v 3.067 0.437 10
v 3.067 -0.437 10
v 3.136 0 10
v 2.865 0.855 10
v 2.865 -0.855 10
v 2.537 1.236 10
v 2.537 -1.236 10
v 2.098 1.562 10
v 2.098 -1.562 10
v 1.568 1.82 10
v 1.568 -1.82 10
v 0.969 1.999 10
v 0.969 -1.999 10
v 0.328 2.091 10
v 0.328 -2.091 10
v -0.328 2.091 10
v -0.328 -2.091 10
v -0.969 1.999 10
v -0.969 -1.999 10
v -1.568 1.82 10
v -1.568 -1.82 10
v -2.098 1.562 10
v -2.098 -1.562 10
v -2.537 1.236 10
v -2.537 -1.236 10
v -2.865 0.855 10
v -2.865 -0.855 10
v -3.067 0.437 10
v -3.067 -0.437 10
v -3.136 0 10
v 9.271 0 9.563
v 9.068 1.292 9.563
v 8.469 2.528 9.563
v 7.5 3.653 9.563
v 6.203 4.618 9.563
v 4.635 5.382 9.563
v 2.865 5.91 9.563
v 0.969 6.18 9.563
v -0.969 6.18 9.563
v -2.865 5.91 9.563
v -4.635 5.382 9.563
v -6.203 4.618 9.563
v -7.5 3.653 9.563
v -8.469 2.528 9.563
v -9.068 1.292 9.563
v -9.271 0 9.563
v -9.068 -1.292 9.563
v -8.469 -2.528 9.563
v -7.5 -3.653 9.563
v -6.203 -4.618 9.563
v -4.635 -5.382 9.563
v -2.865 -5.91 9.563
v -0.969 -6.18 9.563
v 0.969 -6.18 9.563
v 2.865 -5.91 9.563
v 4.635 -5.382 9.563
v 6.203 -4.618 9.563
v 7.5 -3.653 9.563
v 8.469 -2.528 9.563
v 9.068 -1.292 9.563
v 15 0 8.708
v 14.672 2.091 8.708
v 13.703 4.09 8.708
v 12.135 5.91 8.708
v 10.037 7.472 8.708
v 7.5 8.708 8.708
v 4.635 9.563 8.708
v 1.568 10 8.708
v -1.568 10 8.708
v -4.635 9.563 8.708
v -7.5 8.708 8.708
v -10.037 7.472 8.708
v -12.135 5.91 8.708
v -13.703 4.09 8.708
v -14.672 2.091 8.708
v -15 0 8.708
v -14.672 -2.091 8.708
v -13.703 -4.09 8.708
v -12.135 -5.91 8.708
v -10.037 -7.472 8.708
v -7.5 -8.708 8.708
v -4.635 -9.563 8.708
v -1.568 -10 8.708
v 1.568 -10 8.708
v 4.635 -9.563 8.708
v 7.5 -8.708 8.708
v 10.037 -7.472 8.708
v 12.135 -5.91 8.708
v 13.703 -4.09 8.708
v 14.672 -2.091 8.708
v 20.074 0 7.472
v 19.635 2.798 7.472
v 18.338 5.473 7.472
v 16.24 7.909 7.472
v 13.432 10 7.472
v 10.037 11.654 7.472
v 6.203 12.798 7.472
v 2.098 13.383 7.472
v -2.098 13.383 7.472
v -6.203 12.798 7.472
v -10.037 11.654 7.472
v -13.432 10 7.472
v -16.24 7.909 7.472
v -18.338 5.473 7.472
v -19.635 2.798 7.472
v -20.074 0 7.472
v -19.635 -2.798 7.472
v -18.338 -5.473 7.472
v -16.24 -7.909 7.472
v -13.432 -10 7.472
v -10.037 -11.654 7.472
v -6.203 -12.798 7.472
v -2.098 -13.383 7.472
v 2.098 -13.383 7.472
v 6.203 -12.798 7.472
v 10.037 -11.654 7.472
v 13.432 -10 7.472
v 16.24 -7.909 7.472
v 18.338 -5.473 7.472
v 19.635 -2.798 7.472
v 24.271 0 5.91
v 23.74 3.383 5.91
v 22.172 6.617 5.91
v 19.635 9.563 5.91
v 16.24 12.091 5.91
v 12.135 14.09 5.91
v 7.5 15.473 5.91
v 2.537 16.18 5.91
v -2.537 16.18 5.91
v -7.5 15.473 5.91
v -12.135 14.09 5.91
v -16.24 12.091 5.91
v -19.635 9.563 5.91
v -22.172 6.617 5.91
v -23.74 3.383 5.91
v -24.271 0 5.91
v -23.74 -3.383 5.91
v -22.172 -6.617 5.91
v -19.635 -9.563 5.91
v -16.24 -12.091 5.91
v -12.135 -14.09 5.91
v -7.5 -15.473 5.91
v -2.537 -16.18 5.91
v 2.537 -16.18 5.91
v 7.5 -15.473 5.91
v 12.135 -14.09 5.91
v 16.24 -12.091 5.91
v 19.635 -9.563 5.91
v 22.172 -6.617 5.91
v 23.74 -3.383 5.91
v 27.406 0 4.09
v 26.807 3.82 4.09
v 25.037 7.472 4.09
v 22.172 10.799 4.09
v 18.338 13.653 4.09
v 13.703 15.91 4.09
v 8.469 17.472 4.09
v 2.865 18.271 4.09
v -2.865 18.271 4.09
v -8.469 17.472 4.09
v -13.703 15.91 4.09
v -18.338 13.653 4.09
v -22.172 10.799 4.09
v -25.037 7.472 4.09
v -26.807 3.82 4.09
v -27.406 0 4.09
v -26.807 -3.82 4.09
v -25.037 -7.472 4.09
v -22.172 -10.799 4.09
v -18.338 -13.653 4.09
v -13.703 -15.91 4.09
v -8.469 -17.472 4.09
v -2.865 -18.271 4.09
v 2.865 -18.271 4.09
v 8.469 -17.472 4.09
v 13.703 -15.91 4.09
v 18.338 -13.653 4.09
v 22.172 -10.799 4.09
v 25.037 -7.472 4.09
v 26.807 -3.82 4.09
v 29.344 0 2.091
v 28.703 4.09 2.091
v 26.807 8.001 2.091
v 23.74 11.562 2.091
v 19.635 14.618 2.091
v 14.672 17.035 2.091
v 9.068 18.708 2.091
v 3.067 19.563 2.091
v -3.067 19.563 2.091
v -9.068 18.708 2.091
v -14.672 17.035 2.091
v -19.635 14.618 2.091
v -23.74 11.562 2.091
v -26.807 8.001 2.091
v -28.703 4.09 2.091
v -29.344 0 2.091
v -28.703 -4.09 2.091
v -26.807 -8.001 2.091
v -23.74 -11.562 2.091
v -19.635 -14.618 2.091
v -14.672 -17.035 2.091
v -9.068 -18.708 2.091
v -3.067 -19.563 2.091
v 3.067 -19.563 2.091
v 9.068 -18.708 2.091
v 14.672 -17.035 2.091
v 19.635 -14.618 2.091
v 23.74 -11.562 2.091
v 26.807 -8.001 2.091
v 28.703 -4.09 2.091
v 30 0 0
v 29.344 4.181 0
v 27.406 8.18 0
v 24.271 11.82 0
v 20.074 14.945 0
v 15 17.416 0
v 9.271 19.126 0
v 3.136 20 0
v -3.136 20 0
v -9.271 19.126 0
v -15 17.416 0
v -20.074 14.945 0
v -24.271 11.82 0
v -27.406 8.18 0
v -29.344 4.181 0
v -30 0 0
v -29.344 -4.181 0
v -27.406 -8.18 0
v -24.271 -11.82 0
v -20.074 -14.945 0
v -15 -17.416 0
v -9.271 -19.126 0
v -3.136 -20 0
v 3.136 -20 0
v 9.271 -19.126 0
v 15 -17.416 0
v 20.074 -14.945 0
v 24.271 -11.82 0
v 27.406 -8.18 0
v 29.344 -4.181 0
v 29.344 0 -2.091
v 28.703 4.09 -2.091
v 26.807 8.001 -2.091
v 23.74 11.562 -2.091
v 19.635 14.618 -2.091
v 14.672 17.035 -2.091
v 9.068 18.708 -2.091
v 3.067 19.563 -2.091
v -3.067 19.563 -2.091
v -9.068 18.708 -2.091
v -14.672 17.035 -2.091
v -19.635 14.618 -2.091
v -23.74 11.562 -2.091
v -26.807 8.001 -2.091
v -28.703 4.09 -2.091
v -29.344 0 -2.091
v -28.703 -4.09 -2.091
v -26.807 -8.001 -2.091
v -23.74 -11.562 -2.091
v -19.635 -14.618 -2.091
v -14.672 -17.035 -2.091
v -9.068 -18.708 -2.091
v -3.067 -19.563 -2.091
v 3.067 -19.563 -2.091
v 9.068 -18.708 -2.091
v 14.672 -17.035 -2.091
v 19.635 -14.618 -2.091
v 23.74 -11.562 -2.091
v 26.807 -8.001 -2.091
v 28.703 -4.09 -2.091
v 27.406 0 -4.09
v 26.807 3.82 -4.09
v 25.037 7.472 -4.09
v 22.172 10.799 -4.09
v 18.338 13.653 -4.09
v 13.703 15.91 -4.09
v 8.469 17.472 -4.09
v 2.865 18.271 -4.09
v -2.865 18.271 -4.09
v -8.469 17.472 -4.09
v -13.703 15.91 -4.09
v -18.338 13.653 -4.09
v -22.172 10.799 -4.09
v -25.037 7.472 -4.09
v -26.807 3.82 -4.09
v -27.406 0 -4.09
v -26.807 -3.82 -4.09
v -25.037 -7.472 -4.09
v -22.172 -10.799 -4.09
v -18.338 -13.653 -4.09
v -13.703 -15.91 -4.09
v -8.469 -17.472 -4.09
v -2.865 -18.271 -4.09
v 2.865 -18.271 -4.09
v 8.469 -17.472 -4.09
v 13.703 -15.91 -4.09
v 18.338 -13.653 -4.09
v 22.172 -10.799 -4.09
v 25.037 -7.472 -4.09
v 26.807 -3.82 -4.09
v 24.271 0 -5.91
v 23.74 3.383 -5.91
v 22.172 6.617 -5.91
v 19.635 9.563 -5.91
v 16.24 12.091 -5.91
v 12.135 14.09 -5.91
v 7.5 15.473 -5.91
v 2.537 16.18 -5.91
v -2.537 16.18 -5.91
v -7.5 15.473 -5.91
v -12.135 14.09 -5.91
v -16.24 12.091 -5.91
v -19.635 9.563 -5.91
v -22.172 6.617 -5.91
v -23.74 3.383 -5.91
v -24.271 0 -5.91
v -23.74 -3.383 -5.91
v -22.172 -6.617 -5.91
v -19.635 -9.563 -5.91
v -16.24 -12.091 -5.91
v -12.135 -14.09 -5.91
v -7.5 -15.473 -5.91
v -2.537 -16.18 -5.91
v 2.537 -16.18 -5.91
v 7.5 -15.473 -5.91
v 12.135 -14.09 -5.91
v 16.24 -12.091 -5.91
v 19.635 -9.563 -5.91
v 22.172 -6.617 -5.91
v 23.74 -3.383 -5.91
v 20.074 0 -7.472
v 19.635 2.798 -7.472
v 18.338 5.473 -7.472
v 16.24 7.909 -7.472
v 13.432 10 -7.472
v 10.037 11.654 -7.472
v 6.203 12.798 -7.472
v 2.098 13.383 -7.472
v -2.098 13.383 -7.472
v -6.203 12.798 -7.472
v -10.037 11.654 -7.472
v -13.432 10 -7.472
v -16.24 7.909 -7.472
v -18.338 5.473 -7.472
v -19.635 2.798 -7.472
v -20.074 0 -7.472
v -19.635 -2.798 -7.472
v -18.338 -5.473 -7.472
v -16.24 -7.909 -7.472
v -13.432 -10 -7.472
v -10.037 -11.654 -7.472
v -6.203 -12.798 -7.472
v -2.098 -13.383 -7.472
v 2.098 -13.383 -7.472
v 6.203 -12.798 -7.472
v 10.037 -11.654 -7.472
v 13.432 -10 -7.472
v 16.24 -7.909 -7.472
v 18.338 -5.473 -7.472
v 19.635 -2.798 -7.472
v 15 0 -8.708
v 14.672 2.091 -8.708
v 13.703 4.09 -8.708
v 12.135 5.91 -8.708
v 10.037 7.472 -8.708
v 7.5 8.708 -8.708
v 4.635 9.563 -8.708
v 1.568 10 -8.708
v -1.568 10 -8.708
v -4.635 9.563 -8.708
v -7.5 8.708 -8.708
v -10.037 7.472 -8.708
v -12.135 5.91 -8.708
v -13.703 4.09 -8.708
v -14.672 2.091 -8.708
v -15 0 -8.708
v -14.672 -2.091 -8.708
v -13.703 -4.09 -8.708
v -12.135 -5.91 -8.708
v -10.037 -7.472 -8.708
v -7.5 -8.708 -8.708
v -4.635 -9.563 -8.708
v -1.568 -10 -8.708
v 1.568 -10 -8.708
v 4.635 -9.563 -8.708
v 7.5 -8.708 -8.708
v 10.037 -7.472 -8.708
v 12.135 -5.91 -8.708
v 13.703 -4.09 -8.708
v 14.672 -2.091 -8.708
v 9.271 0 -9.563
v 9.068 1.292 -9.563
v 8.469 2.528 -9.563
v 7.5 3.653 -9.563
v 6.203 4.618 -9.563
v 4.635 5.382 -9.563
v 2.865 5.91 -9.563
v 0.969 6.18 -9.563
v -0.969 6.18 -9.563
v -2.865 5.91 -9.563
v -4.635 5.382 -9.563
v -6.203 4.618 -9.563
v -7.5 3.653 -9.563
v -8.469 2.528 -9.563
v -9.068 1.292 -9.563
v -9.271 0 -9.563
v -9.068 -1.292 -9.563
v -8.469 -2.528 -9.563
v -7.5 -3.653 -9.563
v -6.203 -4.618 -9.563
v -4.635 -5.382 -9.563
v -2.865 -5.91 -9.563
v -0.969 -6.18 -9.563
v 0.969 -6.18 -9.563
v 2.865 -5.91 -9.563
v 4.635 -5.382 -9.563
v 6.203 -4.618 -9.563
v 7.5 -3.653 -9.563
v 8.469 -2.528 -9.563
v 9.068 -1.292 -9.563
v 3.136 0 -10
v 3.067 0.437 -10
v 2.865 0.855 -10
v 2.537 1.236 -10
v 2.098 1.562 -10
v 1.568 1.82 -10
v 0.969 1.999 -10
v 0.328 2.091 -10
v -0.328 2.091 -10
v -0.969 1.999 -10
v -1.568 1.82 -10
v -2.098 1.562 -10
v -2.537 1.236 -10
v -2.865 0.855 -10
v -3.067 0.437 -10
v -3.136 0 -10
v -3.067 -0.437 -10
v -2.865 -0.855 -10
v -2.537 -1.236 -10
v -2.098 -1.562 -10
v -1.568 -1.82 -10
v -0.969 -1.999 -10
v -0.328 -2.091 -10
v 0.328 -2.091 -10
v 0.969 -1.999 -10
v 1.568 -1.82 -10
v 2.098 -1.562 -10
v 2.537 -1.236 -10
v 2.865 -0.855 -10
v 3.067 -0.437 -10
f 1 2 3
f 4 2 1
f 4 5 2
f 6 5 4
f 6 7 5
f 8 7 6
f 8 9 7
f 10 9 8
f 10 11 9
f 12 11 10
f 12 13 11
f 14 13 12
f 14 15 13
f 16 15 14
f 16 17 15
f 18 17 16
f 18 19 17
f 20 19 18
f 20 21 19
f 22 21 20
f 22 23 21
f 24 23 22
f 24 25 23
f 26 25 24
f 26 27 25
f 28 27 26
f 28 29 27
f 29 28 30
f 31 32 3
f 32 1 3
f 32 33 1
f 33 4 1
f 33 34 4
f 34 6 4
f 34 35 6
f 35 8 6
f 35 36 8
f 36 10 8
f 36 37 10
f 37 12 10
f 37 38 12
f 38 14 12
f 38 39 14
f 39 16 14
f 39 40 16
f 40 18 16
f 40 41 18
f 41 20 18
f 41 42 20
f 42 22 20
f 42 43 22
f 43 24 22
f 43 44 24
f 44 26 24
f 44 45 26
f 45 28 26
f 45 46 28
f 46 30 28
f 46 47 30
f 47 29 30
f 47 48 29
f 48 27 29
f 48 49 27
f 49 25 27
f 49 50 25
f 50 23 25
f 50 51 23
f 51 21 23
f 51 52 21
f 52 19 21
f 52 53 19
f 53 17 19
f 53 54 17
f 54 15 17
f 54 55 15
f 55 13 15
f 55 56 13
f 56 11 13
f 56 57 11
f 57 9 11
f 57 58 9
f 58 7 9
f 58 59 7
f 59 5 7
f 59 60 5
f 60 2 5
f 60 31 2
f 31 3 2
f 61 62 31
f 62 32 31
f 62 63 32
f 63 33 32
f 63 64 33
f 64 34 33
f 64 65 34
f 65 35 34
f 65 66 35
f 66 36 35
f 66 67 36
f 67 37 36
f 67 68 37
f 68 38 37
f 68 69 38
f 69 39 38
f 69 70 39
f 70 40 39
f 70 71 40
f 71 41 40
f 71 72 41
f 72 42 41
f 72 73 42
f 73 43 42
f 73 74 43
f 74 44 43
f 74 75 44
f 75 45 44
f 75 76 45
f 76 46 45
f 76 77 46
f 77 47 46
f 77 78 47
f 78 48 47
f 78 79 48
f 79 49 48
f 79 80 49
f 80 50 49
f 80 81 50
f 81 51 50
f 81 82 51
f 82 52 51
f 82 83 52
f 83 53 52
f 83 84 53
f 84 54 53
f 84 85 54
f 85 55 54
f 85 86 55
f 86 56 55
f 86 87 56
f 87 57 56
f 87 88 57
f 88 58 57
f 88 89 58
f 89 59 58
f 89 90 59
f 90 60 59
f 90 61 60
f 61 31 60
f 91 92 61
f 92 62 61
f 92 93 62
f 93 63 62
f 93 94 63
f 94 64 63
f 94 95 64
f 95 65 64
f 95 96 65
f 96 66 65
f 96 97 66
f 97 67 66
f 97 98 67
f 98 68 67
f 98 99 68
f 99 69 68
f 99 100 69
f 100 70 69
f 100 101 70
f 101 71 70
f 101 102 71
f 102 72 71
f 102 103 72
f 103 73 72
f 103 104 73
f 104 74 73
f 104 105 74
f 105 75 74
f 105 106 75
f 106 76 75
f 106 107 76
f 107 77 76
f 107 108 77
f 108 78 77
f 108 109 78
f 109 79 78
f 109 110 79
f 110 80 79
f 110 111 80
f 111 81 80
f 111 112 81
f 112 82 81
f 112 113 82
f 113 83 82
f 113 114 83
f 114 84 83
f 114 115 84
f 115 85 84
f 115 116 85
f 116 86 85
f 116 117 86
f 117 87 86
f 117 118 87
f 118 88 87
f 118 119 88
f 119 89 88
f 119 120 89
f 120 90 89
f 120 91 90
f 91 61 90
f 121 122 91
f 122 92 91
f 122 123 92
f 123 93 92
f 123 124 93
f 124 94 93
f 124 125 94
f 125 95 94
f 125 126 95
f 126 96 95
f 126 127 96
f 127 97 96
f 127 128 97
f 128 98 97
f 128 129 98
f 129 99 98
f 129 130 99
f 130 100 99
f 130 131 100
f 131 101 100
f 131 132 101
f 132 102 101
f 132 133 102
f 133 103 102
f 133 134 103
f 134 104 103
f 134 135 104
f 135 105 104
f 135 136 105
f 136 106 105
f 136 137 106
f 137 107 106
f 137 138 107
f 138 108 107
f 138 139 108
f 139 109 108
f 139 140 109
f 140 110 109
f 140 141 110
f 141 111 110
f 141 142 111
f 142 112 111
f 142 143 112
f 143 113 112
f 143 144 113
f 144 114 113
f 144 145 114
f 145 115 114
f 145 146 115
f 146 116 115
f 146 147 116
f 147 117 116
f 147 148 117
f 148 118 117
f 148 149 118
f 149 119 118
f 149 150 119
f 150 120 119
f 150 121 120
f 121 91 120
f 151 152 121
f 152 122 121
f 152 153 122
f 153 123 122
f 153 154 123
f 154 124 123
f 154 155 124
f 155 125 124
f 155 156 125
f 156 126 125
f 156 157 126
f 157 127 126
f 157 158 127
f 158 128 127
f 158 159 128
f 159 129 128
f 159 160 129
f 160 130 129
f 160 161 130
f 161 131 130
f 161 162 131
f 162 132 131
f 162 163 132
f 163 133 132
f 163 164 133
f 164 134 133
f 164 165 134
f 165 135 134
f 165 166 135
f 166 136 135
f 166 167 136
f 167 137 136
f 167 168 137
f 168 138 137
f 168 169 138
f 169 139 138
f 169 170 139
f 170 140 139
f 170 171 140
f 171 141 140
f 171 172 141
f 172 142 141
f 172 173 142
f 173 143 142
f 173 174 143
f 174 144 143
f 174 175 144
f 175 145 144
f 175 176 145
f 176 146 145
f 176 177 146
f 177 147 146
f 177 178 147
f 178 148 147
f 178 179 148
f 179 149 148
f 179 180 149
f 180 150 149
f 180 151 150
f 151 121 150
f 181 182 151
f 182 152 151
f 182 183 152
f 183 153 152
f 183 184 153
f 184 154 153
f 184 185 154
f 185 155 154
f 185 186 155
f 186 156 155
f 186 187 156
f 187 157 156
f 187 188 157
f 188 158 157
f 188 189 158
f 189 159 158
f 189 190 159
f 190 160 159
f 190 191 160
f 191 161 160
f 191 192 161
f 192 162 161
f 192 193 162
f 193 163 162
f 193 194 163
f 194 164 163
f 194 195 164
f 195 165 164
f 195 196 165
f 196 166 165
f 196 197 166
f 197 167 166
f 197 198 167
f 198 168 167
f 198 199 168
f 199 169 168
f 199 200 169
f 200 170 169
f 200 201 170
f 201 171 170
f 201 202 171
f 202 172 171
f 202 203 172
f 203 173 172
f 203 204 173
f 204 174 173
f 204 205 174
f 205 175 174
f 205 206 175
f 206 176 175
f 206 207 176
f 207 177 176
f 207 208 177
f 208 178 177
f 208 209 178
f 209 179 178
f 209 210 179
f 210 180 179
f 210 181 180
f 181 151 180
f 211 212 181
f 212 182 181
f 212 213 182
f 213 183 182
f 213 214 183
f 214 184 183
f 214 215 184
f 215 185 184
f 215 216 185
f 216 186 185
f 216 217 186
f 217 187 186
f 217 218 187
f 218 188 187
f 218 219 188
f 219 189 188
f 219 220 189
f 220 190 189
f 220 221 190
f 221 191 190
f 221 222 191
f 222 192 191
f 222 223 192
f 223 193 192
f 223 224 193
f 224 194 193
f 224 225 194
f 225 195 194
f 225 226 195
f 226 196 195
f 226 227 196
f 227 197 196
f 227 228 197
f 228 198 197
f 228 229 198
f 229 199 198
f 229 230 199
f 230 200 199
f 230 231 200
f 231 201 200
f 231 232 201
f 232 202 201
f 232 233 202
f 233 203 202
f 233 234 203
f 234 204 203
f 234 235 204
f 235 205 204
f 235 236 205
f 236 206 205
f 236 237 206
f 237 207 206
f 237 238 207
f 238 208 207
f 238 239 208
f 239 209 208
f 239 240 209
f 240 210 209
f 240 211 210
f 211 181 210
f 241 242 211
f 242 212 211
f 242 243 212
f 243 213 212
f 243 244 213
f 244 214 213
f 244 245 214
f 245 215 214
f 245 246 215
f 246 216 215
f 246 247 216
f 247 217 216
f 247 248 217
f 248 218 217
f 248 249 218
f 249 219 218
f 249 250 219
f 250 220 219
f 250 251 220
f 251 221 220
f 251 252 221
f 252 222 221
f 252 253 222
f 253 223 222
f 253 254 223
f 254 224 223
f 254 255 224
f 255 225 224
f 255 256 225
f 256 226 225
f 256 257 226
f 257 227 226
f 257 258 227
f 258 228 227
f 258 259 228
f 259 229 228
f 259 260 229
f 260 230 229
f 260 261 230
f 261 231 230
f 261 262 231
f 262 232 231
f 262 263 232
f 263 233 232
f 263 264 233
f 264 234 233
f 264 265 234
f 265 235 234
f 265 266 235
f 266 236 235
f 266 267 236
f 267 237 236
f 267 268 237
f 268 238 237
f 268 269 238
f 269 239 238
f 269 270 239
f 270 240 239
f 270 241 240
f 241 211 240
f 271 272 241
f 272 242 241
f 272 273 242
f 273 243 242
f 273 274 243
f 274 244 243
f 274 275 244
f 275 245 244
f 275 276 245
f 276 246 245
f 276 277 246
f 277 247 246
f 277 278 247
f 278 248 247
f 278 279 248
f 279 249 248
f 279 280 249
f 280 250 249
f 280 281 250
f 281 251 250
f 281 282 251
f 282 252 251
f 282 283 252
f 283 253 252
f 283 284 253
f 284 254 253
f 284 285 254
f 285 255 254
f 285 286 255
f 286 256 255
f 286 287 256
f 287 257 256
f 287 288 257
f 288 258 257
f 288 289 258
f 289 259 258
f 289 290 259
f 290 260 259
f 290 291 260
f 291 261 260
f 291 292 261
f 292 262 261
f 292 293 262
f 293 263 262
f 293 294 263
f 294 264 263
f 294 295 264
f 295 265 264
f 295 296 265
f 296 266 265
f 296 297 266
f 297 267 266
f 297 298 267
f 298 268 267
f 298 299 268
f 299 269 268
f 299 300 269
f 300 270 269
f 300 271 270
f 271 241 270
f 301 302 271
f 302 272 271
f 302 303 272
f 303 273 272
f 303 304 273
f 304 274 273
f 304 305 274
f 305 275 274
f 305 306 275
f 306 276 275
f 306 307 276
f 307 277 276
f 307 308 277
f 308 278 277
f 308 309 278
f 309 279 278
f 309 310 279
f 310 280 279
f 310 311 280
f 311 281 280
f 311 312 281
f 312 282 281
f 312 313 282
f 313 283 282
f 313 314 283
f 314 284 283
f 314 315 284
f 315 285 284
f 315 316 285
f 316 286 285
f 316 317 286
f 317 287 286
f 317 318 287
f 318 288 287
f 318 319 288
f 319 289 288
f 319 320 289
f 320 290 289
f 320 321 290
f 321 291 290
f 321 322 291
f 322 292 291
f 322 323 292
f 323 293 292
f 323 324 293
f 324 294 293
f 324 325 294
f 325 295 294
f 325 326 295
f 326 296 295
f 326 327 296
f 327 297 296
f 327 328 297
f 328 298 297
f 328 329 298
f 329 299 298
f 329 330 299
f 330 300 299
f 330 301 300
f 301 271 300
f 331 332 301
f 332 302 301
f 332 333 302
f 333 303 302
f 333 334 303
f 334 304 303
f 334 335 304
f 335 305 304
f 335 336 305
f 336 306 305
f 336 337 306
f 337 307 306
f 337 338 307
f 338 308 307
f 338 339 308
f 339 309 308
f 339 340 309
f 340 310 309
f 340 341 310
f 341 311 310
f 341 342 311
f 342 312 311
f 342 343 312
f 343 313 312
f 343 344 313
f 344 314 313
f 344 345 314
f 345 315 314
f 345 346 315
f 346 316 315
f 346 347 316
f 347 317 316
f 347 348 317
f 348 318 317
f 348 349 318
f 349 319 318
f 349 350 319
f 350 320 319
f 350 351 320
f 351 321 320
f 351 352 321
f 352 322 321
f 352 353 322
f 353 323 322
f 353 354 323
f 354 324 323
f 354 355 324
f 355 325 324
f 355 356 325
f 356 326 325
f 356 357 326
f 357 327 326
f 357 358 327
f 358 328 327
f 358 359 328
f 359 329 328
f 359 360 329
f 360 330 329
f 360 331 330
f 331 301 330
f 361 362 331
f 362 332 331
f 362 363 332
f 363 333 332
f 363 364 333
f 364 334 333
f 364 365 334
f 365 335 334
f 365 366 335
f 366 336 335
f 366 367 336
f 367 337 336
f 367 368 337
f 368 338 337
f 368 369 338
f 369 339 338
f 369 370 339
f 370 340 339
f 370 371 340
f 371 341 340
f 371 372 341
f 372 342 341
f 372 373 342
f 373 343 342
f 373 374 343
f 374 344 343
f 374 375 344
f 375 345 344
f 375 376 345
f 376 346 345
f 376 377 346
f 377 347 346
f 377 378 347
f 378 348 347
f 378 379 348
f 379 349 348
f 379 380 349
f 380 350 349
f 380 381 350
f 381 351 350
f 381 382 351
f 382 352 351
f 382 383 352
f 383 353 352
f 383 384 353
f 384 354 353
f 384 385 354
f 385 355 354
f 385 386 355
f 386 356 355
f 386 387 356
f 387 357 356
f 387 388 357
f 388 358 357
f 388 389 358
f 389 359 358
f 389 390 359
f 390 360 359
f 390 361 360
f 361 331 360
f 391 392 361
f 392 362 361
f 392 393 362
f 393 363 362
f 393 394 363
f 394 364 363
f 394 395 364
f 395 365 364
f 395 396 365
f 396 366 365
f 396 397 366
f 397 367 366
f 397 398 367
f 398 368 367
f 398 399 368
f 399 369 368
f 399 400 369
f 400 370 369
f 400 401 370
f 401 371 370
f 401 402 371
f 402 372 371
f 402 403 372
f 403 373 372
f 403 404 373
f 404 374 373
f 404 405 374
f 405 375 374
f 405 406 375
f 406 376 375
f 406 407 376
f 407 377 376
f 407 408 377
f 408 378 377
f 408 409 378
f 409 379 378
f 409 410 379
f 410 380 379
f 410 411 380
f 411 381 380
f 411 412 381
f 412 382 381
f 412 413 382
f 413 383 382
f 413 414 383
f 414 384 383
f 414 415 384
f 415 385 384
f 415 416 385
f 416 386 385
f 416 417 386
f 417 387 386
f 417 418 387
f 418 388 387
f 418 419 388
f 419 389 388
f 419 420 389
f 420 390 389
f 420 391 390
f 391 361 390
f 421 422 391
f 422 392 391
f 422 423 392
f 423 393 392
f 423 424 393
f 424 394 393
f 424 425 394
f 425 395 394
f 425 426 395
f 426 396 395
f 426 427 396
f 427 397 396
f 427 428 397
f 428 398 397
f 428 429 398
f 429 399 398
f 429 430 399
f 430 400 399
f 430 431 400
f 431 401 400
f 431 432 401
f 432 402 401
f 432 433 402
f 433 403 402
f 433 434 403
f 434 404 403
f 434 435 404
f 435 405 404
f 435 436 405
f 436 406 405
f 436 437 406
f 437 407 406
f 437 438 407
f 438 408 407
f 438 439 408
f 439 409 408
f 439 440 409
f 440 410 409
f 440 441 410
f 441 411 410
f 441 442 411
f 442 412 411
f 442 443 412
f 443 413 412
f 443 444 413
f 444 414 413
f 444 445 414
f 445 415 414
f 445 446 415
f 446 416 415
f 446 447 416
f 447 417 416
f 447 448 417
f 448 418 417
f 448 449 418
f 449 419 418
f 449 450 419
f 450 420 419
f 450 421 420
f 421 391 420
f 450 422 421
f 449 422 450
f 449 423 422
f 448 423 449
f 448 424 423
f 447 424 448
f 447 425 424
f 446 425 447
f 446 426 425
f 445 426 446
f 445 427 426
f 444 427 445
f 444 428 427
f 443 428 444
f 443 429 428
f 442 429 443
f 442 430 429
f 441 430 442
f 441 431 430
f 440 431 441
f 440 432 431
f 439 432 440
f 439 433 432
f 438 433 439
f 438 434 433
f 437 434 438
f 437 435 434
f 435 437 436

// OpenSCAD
// Unit of length: Unit.MM
resize(newsize = [60.0, 40.0, 20.0], auto = [false, false, false])
{
   sphere(d = 60.0);
}
